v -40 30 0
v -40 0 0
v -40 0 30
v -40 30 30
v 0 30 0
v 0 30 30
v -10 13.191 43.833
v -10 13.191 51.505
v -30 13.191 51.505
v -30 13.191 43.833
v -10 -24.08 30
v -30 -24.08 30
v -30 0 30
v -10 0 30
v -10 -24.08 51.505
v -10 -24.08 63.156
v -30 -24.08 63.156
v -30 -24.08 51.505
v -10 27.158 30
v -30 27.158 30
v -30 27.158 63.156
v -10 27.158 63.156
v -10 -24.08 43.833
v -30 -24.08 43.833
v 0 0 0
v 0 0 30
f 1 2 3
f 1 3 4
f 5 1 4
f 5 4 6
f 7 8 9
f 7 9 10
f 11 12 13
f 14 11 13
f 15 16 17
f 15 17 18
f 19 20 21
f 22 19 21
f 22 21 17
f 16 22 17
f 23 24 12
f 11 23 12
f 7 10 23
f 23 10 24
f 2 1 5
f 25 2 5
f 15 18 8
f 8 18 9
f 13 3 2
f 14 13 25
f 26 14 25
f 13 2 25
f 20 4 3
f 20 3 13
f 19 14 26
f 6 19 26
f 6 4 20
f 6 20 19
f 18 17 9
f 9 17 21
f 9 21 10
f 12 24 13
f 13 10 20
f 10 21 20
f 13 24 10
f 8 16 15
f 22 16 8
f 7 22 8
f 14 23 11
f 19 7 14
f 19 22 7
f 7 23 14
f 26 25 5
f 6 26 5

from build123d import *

# Parameters (mm, degrees)
ESQUISSE1_W        = 40
ESQUISSE1_H        = 30
BOSS_EXTRU_1_DEPTH = 30
BOSS_EXTRU_2_START = -10
BOSS_EXTRU_2_DEPTH = 20


with BuildPart() as part:
    # Esquisse1 → Boss.-Extru.1 (new body)
    with BuildSketch(Plane.XY):
        with Locations((-20, 15)):
            Rectangle(ESQUISSE1_W, ESQUISSE1_H)
    extrude(amount=BOSS_EXTRU_1_DEPTH)

    # Esquisse2 → Boss.-Extru.2 (add)
    with BuildSketch(Plane.ZY.offset(40).offset(BOSS_EXTRU_2_START)):
        Polygon((30, 27.158170339), (63.156193336, 27.158170339), (63.156193336, -24.079833233), (51.504613428, -24.079833233), (51.504613428, 13.190748461), (43.833386904, 13.190748461), (43.833386904, -24.079833233), (30, -24.079833233), align=None)
    extrude(amount=-BOSS_EXTRU_2_DEPTH)


solid = part.part
